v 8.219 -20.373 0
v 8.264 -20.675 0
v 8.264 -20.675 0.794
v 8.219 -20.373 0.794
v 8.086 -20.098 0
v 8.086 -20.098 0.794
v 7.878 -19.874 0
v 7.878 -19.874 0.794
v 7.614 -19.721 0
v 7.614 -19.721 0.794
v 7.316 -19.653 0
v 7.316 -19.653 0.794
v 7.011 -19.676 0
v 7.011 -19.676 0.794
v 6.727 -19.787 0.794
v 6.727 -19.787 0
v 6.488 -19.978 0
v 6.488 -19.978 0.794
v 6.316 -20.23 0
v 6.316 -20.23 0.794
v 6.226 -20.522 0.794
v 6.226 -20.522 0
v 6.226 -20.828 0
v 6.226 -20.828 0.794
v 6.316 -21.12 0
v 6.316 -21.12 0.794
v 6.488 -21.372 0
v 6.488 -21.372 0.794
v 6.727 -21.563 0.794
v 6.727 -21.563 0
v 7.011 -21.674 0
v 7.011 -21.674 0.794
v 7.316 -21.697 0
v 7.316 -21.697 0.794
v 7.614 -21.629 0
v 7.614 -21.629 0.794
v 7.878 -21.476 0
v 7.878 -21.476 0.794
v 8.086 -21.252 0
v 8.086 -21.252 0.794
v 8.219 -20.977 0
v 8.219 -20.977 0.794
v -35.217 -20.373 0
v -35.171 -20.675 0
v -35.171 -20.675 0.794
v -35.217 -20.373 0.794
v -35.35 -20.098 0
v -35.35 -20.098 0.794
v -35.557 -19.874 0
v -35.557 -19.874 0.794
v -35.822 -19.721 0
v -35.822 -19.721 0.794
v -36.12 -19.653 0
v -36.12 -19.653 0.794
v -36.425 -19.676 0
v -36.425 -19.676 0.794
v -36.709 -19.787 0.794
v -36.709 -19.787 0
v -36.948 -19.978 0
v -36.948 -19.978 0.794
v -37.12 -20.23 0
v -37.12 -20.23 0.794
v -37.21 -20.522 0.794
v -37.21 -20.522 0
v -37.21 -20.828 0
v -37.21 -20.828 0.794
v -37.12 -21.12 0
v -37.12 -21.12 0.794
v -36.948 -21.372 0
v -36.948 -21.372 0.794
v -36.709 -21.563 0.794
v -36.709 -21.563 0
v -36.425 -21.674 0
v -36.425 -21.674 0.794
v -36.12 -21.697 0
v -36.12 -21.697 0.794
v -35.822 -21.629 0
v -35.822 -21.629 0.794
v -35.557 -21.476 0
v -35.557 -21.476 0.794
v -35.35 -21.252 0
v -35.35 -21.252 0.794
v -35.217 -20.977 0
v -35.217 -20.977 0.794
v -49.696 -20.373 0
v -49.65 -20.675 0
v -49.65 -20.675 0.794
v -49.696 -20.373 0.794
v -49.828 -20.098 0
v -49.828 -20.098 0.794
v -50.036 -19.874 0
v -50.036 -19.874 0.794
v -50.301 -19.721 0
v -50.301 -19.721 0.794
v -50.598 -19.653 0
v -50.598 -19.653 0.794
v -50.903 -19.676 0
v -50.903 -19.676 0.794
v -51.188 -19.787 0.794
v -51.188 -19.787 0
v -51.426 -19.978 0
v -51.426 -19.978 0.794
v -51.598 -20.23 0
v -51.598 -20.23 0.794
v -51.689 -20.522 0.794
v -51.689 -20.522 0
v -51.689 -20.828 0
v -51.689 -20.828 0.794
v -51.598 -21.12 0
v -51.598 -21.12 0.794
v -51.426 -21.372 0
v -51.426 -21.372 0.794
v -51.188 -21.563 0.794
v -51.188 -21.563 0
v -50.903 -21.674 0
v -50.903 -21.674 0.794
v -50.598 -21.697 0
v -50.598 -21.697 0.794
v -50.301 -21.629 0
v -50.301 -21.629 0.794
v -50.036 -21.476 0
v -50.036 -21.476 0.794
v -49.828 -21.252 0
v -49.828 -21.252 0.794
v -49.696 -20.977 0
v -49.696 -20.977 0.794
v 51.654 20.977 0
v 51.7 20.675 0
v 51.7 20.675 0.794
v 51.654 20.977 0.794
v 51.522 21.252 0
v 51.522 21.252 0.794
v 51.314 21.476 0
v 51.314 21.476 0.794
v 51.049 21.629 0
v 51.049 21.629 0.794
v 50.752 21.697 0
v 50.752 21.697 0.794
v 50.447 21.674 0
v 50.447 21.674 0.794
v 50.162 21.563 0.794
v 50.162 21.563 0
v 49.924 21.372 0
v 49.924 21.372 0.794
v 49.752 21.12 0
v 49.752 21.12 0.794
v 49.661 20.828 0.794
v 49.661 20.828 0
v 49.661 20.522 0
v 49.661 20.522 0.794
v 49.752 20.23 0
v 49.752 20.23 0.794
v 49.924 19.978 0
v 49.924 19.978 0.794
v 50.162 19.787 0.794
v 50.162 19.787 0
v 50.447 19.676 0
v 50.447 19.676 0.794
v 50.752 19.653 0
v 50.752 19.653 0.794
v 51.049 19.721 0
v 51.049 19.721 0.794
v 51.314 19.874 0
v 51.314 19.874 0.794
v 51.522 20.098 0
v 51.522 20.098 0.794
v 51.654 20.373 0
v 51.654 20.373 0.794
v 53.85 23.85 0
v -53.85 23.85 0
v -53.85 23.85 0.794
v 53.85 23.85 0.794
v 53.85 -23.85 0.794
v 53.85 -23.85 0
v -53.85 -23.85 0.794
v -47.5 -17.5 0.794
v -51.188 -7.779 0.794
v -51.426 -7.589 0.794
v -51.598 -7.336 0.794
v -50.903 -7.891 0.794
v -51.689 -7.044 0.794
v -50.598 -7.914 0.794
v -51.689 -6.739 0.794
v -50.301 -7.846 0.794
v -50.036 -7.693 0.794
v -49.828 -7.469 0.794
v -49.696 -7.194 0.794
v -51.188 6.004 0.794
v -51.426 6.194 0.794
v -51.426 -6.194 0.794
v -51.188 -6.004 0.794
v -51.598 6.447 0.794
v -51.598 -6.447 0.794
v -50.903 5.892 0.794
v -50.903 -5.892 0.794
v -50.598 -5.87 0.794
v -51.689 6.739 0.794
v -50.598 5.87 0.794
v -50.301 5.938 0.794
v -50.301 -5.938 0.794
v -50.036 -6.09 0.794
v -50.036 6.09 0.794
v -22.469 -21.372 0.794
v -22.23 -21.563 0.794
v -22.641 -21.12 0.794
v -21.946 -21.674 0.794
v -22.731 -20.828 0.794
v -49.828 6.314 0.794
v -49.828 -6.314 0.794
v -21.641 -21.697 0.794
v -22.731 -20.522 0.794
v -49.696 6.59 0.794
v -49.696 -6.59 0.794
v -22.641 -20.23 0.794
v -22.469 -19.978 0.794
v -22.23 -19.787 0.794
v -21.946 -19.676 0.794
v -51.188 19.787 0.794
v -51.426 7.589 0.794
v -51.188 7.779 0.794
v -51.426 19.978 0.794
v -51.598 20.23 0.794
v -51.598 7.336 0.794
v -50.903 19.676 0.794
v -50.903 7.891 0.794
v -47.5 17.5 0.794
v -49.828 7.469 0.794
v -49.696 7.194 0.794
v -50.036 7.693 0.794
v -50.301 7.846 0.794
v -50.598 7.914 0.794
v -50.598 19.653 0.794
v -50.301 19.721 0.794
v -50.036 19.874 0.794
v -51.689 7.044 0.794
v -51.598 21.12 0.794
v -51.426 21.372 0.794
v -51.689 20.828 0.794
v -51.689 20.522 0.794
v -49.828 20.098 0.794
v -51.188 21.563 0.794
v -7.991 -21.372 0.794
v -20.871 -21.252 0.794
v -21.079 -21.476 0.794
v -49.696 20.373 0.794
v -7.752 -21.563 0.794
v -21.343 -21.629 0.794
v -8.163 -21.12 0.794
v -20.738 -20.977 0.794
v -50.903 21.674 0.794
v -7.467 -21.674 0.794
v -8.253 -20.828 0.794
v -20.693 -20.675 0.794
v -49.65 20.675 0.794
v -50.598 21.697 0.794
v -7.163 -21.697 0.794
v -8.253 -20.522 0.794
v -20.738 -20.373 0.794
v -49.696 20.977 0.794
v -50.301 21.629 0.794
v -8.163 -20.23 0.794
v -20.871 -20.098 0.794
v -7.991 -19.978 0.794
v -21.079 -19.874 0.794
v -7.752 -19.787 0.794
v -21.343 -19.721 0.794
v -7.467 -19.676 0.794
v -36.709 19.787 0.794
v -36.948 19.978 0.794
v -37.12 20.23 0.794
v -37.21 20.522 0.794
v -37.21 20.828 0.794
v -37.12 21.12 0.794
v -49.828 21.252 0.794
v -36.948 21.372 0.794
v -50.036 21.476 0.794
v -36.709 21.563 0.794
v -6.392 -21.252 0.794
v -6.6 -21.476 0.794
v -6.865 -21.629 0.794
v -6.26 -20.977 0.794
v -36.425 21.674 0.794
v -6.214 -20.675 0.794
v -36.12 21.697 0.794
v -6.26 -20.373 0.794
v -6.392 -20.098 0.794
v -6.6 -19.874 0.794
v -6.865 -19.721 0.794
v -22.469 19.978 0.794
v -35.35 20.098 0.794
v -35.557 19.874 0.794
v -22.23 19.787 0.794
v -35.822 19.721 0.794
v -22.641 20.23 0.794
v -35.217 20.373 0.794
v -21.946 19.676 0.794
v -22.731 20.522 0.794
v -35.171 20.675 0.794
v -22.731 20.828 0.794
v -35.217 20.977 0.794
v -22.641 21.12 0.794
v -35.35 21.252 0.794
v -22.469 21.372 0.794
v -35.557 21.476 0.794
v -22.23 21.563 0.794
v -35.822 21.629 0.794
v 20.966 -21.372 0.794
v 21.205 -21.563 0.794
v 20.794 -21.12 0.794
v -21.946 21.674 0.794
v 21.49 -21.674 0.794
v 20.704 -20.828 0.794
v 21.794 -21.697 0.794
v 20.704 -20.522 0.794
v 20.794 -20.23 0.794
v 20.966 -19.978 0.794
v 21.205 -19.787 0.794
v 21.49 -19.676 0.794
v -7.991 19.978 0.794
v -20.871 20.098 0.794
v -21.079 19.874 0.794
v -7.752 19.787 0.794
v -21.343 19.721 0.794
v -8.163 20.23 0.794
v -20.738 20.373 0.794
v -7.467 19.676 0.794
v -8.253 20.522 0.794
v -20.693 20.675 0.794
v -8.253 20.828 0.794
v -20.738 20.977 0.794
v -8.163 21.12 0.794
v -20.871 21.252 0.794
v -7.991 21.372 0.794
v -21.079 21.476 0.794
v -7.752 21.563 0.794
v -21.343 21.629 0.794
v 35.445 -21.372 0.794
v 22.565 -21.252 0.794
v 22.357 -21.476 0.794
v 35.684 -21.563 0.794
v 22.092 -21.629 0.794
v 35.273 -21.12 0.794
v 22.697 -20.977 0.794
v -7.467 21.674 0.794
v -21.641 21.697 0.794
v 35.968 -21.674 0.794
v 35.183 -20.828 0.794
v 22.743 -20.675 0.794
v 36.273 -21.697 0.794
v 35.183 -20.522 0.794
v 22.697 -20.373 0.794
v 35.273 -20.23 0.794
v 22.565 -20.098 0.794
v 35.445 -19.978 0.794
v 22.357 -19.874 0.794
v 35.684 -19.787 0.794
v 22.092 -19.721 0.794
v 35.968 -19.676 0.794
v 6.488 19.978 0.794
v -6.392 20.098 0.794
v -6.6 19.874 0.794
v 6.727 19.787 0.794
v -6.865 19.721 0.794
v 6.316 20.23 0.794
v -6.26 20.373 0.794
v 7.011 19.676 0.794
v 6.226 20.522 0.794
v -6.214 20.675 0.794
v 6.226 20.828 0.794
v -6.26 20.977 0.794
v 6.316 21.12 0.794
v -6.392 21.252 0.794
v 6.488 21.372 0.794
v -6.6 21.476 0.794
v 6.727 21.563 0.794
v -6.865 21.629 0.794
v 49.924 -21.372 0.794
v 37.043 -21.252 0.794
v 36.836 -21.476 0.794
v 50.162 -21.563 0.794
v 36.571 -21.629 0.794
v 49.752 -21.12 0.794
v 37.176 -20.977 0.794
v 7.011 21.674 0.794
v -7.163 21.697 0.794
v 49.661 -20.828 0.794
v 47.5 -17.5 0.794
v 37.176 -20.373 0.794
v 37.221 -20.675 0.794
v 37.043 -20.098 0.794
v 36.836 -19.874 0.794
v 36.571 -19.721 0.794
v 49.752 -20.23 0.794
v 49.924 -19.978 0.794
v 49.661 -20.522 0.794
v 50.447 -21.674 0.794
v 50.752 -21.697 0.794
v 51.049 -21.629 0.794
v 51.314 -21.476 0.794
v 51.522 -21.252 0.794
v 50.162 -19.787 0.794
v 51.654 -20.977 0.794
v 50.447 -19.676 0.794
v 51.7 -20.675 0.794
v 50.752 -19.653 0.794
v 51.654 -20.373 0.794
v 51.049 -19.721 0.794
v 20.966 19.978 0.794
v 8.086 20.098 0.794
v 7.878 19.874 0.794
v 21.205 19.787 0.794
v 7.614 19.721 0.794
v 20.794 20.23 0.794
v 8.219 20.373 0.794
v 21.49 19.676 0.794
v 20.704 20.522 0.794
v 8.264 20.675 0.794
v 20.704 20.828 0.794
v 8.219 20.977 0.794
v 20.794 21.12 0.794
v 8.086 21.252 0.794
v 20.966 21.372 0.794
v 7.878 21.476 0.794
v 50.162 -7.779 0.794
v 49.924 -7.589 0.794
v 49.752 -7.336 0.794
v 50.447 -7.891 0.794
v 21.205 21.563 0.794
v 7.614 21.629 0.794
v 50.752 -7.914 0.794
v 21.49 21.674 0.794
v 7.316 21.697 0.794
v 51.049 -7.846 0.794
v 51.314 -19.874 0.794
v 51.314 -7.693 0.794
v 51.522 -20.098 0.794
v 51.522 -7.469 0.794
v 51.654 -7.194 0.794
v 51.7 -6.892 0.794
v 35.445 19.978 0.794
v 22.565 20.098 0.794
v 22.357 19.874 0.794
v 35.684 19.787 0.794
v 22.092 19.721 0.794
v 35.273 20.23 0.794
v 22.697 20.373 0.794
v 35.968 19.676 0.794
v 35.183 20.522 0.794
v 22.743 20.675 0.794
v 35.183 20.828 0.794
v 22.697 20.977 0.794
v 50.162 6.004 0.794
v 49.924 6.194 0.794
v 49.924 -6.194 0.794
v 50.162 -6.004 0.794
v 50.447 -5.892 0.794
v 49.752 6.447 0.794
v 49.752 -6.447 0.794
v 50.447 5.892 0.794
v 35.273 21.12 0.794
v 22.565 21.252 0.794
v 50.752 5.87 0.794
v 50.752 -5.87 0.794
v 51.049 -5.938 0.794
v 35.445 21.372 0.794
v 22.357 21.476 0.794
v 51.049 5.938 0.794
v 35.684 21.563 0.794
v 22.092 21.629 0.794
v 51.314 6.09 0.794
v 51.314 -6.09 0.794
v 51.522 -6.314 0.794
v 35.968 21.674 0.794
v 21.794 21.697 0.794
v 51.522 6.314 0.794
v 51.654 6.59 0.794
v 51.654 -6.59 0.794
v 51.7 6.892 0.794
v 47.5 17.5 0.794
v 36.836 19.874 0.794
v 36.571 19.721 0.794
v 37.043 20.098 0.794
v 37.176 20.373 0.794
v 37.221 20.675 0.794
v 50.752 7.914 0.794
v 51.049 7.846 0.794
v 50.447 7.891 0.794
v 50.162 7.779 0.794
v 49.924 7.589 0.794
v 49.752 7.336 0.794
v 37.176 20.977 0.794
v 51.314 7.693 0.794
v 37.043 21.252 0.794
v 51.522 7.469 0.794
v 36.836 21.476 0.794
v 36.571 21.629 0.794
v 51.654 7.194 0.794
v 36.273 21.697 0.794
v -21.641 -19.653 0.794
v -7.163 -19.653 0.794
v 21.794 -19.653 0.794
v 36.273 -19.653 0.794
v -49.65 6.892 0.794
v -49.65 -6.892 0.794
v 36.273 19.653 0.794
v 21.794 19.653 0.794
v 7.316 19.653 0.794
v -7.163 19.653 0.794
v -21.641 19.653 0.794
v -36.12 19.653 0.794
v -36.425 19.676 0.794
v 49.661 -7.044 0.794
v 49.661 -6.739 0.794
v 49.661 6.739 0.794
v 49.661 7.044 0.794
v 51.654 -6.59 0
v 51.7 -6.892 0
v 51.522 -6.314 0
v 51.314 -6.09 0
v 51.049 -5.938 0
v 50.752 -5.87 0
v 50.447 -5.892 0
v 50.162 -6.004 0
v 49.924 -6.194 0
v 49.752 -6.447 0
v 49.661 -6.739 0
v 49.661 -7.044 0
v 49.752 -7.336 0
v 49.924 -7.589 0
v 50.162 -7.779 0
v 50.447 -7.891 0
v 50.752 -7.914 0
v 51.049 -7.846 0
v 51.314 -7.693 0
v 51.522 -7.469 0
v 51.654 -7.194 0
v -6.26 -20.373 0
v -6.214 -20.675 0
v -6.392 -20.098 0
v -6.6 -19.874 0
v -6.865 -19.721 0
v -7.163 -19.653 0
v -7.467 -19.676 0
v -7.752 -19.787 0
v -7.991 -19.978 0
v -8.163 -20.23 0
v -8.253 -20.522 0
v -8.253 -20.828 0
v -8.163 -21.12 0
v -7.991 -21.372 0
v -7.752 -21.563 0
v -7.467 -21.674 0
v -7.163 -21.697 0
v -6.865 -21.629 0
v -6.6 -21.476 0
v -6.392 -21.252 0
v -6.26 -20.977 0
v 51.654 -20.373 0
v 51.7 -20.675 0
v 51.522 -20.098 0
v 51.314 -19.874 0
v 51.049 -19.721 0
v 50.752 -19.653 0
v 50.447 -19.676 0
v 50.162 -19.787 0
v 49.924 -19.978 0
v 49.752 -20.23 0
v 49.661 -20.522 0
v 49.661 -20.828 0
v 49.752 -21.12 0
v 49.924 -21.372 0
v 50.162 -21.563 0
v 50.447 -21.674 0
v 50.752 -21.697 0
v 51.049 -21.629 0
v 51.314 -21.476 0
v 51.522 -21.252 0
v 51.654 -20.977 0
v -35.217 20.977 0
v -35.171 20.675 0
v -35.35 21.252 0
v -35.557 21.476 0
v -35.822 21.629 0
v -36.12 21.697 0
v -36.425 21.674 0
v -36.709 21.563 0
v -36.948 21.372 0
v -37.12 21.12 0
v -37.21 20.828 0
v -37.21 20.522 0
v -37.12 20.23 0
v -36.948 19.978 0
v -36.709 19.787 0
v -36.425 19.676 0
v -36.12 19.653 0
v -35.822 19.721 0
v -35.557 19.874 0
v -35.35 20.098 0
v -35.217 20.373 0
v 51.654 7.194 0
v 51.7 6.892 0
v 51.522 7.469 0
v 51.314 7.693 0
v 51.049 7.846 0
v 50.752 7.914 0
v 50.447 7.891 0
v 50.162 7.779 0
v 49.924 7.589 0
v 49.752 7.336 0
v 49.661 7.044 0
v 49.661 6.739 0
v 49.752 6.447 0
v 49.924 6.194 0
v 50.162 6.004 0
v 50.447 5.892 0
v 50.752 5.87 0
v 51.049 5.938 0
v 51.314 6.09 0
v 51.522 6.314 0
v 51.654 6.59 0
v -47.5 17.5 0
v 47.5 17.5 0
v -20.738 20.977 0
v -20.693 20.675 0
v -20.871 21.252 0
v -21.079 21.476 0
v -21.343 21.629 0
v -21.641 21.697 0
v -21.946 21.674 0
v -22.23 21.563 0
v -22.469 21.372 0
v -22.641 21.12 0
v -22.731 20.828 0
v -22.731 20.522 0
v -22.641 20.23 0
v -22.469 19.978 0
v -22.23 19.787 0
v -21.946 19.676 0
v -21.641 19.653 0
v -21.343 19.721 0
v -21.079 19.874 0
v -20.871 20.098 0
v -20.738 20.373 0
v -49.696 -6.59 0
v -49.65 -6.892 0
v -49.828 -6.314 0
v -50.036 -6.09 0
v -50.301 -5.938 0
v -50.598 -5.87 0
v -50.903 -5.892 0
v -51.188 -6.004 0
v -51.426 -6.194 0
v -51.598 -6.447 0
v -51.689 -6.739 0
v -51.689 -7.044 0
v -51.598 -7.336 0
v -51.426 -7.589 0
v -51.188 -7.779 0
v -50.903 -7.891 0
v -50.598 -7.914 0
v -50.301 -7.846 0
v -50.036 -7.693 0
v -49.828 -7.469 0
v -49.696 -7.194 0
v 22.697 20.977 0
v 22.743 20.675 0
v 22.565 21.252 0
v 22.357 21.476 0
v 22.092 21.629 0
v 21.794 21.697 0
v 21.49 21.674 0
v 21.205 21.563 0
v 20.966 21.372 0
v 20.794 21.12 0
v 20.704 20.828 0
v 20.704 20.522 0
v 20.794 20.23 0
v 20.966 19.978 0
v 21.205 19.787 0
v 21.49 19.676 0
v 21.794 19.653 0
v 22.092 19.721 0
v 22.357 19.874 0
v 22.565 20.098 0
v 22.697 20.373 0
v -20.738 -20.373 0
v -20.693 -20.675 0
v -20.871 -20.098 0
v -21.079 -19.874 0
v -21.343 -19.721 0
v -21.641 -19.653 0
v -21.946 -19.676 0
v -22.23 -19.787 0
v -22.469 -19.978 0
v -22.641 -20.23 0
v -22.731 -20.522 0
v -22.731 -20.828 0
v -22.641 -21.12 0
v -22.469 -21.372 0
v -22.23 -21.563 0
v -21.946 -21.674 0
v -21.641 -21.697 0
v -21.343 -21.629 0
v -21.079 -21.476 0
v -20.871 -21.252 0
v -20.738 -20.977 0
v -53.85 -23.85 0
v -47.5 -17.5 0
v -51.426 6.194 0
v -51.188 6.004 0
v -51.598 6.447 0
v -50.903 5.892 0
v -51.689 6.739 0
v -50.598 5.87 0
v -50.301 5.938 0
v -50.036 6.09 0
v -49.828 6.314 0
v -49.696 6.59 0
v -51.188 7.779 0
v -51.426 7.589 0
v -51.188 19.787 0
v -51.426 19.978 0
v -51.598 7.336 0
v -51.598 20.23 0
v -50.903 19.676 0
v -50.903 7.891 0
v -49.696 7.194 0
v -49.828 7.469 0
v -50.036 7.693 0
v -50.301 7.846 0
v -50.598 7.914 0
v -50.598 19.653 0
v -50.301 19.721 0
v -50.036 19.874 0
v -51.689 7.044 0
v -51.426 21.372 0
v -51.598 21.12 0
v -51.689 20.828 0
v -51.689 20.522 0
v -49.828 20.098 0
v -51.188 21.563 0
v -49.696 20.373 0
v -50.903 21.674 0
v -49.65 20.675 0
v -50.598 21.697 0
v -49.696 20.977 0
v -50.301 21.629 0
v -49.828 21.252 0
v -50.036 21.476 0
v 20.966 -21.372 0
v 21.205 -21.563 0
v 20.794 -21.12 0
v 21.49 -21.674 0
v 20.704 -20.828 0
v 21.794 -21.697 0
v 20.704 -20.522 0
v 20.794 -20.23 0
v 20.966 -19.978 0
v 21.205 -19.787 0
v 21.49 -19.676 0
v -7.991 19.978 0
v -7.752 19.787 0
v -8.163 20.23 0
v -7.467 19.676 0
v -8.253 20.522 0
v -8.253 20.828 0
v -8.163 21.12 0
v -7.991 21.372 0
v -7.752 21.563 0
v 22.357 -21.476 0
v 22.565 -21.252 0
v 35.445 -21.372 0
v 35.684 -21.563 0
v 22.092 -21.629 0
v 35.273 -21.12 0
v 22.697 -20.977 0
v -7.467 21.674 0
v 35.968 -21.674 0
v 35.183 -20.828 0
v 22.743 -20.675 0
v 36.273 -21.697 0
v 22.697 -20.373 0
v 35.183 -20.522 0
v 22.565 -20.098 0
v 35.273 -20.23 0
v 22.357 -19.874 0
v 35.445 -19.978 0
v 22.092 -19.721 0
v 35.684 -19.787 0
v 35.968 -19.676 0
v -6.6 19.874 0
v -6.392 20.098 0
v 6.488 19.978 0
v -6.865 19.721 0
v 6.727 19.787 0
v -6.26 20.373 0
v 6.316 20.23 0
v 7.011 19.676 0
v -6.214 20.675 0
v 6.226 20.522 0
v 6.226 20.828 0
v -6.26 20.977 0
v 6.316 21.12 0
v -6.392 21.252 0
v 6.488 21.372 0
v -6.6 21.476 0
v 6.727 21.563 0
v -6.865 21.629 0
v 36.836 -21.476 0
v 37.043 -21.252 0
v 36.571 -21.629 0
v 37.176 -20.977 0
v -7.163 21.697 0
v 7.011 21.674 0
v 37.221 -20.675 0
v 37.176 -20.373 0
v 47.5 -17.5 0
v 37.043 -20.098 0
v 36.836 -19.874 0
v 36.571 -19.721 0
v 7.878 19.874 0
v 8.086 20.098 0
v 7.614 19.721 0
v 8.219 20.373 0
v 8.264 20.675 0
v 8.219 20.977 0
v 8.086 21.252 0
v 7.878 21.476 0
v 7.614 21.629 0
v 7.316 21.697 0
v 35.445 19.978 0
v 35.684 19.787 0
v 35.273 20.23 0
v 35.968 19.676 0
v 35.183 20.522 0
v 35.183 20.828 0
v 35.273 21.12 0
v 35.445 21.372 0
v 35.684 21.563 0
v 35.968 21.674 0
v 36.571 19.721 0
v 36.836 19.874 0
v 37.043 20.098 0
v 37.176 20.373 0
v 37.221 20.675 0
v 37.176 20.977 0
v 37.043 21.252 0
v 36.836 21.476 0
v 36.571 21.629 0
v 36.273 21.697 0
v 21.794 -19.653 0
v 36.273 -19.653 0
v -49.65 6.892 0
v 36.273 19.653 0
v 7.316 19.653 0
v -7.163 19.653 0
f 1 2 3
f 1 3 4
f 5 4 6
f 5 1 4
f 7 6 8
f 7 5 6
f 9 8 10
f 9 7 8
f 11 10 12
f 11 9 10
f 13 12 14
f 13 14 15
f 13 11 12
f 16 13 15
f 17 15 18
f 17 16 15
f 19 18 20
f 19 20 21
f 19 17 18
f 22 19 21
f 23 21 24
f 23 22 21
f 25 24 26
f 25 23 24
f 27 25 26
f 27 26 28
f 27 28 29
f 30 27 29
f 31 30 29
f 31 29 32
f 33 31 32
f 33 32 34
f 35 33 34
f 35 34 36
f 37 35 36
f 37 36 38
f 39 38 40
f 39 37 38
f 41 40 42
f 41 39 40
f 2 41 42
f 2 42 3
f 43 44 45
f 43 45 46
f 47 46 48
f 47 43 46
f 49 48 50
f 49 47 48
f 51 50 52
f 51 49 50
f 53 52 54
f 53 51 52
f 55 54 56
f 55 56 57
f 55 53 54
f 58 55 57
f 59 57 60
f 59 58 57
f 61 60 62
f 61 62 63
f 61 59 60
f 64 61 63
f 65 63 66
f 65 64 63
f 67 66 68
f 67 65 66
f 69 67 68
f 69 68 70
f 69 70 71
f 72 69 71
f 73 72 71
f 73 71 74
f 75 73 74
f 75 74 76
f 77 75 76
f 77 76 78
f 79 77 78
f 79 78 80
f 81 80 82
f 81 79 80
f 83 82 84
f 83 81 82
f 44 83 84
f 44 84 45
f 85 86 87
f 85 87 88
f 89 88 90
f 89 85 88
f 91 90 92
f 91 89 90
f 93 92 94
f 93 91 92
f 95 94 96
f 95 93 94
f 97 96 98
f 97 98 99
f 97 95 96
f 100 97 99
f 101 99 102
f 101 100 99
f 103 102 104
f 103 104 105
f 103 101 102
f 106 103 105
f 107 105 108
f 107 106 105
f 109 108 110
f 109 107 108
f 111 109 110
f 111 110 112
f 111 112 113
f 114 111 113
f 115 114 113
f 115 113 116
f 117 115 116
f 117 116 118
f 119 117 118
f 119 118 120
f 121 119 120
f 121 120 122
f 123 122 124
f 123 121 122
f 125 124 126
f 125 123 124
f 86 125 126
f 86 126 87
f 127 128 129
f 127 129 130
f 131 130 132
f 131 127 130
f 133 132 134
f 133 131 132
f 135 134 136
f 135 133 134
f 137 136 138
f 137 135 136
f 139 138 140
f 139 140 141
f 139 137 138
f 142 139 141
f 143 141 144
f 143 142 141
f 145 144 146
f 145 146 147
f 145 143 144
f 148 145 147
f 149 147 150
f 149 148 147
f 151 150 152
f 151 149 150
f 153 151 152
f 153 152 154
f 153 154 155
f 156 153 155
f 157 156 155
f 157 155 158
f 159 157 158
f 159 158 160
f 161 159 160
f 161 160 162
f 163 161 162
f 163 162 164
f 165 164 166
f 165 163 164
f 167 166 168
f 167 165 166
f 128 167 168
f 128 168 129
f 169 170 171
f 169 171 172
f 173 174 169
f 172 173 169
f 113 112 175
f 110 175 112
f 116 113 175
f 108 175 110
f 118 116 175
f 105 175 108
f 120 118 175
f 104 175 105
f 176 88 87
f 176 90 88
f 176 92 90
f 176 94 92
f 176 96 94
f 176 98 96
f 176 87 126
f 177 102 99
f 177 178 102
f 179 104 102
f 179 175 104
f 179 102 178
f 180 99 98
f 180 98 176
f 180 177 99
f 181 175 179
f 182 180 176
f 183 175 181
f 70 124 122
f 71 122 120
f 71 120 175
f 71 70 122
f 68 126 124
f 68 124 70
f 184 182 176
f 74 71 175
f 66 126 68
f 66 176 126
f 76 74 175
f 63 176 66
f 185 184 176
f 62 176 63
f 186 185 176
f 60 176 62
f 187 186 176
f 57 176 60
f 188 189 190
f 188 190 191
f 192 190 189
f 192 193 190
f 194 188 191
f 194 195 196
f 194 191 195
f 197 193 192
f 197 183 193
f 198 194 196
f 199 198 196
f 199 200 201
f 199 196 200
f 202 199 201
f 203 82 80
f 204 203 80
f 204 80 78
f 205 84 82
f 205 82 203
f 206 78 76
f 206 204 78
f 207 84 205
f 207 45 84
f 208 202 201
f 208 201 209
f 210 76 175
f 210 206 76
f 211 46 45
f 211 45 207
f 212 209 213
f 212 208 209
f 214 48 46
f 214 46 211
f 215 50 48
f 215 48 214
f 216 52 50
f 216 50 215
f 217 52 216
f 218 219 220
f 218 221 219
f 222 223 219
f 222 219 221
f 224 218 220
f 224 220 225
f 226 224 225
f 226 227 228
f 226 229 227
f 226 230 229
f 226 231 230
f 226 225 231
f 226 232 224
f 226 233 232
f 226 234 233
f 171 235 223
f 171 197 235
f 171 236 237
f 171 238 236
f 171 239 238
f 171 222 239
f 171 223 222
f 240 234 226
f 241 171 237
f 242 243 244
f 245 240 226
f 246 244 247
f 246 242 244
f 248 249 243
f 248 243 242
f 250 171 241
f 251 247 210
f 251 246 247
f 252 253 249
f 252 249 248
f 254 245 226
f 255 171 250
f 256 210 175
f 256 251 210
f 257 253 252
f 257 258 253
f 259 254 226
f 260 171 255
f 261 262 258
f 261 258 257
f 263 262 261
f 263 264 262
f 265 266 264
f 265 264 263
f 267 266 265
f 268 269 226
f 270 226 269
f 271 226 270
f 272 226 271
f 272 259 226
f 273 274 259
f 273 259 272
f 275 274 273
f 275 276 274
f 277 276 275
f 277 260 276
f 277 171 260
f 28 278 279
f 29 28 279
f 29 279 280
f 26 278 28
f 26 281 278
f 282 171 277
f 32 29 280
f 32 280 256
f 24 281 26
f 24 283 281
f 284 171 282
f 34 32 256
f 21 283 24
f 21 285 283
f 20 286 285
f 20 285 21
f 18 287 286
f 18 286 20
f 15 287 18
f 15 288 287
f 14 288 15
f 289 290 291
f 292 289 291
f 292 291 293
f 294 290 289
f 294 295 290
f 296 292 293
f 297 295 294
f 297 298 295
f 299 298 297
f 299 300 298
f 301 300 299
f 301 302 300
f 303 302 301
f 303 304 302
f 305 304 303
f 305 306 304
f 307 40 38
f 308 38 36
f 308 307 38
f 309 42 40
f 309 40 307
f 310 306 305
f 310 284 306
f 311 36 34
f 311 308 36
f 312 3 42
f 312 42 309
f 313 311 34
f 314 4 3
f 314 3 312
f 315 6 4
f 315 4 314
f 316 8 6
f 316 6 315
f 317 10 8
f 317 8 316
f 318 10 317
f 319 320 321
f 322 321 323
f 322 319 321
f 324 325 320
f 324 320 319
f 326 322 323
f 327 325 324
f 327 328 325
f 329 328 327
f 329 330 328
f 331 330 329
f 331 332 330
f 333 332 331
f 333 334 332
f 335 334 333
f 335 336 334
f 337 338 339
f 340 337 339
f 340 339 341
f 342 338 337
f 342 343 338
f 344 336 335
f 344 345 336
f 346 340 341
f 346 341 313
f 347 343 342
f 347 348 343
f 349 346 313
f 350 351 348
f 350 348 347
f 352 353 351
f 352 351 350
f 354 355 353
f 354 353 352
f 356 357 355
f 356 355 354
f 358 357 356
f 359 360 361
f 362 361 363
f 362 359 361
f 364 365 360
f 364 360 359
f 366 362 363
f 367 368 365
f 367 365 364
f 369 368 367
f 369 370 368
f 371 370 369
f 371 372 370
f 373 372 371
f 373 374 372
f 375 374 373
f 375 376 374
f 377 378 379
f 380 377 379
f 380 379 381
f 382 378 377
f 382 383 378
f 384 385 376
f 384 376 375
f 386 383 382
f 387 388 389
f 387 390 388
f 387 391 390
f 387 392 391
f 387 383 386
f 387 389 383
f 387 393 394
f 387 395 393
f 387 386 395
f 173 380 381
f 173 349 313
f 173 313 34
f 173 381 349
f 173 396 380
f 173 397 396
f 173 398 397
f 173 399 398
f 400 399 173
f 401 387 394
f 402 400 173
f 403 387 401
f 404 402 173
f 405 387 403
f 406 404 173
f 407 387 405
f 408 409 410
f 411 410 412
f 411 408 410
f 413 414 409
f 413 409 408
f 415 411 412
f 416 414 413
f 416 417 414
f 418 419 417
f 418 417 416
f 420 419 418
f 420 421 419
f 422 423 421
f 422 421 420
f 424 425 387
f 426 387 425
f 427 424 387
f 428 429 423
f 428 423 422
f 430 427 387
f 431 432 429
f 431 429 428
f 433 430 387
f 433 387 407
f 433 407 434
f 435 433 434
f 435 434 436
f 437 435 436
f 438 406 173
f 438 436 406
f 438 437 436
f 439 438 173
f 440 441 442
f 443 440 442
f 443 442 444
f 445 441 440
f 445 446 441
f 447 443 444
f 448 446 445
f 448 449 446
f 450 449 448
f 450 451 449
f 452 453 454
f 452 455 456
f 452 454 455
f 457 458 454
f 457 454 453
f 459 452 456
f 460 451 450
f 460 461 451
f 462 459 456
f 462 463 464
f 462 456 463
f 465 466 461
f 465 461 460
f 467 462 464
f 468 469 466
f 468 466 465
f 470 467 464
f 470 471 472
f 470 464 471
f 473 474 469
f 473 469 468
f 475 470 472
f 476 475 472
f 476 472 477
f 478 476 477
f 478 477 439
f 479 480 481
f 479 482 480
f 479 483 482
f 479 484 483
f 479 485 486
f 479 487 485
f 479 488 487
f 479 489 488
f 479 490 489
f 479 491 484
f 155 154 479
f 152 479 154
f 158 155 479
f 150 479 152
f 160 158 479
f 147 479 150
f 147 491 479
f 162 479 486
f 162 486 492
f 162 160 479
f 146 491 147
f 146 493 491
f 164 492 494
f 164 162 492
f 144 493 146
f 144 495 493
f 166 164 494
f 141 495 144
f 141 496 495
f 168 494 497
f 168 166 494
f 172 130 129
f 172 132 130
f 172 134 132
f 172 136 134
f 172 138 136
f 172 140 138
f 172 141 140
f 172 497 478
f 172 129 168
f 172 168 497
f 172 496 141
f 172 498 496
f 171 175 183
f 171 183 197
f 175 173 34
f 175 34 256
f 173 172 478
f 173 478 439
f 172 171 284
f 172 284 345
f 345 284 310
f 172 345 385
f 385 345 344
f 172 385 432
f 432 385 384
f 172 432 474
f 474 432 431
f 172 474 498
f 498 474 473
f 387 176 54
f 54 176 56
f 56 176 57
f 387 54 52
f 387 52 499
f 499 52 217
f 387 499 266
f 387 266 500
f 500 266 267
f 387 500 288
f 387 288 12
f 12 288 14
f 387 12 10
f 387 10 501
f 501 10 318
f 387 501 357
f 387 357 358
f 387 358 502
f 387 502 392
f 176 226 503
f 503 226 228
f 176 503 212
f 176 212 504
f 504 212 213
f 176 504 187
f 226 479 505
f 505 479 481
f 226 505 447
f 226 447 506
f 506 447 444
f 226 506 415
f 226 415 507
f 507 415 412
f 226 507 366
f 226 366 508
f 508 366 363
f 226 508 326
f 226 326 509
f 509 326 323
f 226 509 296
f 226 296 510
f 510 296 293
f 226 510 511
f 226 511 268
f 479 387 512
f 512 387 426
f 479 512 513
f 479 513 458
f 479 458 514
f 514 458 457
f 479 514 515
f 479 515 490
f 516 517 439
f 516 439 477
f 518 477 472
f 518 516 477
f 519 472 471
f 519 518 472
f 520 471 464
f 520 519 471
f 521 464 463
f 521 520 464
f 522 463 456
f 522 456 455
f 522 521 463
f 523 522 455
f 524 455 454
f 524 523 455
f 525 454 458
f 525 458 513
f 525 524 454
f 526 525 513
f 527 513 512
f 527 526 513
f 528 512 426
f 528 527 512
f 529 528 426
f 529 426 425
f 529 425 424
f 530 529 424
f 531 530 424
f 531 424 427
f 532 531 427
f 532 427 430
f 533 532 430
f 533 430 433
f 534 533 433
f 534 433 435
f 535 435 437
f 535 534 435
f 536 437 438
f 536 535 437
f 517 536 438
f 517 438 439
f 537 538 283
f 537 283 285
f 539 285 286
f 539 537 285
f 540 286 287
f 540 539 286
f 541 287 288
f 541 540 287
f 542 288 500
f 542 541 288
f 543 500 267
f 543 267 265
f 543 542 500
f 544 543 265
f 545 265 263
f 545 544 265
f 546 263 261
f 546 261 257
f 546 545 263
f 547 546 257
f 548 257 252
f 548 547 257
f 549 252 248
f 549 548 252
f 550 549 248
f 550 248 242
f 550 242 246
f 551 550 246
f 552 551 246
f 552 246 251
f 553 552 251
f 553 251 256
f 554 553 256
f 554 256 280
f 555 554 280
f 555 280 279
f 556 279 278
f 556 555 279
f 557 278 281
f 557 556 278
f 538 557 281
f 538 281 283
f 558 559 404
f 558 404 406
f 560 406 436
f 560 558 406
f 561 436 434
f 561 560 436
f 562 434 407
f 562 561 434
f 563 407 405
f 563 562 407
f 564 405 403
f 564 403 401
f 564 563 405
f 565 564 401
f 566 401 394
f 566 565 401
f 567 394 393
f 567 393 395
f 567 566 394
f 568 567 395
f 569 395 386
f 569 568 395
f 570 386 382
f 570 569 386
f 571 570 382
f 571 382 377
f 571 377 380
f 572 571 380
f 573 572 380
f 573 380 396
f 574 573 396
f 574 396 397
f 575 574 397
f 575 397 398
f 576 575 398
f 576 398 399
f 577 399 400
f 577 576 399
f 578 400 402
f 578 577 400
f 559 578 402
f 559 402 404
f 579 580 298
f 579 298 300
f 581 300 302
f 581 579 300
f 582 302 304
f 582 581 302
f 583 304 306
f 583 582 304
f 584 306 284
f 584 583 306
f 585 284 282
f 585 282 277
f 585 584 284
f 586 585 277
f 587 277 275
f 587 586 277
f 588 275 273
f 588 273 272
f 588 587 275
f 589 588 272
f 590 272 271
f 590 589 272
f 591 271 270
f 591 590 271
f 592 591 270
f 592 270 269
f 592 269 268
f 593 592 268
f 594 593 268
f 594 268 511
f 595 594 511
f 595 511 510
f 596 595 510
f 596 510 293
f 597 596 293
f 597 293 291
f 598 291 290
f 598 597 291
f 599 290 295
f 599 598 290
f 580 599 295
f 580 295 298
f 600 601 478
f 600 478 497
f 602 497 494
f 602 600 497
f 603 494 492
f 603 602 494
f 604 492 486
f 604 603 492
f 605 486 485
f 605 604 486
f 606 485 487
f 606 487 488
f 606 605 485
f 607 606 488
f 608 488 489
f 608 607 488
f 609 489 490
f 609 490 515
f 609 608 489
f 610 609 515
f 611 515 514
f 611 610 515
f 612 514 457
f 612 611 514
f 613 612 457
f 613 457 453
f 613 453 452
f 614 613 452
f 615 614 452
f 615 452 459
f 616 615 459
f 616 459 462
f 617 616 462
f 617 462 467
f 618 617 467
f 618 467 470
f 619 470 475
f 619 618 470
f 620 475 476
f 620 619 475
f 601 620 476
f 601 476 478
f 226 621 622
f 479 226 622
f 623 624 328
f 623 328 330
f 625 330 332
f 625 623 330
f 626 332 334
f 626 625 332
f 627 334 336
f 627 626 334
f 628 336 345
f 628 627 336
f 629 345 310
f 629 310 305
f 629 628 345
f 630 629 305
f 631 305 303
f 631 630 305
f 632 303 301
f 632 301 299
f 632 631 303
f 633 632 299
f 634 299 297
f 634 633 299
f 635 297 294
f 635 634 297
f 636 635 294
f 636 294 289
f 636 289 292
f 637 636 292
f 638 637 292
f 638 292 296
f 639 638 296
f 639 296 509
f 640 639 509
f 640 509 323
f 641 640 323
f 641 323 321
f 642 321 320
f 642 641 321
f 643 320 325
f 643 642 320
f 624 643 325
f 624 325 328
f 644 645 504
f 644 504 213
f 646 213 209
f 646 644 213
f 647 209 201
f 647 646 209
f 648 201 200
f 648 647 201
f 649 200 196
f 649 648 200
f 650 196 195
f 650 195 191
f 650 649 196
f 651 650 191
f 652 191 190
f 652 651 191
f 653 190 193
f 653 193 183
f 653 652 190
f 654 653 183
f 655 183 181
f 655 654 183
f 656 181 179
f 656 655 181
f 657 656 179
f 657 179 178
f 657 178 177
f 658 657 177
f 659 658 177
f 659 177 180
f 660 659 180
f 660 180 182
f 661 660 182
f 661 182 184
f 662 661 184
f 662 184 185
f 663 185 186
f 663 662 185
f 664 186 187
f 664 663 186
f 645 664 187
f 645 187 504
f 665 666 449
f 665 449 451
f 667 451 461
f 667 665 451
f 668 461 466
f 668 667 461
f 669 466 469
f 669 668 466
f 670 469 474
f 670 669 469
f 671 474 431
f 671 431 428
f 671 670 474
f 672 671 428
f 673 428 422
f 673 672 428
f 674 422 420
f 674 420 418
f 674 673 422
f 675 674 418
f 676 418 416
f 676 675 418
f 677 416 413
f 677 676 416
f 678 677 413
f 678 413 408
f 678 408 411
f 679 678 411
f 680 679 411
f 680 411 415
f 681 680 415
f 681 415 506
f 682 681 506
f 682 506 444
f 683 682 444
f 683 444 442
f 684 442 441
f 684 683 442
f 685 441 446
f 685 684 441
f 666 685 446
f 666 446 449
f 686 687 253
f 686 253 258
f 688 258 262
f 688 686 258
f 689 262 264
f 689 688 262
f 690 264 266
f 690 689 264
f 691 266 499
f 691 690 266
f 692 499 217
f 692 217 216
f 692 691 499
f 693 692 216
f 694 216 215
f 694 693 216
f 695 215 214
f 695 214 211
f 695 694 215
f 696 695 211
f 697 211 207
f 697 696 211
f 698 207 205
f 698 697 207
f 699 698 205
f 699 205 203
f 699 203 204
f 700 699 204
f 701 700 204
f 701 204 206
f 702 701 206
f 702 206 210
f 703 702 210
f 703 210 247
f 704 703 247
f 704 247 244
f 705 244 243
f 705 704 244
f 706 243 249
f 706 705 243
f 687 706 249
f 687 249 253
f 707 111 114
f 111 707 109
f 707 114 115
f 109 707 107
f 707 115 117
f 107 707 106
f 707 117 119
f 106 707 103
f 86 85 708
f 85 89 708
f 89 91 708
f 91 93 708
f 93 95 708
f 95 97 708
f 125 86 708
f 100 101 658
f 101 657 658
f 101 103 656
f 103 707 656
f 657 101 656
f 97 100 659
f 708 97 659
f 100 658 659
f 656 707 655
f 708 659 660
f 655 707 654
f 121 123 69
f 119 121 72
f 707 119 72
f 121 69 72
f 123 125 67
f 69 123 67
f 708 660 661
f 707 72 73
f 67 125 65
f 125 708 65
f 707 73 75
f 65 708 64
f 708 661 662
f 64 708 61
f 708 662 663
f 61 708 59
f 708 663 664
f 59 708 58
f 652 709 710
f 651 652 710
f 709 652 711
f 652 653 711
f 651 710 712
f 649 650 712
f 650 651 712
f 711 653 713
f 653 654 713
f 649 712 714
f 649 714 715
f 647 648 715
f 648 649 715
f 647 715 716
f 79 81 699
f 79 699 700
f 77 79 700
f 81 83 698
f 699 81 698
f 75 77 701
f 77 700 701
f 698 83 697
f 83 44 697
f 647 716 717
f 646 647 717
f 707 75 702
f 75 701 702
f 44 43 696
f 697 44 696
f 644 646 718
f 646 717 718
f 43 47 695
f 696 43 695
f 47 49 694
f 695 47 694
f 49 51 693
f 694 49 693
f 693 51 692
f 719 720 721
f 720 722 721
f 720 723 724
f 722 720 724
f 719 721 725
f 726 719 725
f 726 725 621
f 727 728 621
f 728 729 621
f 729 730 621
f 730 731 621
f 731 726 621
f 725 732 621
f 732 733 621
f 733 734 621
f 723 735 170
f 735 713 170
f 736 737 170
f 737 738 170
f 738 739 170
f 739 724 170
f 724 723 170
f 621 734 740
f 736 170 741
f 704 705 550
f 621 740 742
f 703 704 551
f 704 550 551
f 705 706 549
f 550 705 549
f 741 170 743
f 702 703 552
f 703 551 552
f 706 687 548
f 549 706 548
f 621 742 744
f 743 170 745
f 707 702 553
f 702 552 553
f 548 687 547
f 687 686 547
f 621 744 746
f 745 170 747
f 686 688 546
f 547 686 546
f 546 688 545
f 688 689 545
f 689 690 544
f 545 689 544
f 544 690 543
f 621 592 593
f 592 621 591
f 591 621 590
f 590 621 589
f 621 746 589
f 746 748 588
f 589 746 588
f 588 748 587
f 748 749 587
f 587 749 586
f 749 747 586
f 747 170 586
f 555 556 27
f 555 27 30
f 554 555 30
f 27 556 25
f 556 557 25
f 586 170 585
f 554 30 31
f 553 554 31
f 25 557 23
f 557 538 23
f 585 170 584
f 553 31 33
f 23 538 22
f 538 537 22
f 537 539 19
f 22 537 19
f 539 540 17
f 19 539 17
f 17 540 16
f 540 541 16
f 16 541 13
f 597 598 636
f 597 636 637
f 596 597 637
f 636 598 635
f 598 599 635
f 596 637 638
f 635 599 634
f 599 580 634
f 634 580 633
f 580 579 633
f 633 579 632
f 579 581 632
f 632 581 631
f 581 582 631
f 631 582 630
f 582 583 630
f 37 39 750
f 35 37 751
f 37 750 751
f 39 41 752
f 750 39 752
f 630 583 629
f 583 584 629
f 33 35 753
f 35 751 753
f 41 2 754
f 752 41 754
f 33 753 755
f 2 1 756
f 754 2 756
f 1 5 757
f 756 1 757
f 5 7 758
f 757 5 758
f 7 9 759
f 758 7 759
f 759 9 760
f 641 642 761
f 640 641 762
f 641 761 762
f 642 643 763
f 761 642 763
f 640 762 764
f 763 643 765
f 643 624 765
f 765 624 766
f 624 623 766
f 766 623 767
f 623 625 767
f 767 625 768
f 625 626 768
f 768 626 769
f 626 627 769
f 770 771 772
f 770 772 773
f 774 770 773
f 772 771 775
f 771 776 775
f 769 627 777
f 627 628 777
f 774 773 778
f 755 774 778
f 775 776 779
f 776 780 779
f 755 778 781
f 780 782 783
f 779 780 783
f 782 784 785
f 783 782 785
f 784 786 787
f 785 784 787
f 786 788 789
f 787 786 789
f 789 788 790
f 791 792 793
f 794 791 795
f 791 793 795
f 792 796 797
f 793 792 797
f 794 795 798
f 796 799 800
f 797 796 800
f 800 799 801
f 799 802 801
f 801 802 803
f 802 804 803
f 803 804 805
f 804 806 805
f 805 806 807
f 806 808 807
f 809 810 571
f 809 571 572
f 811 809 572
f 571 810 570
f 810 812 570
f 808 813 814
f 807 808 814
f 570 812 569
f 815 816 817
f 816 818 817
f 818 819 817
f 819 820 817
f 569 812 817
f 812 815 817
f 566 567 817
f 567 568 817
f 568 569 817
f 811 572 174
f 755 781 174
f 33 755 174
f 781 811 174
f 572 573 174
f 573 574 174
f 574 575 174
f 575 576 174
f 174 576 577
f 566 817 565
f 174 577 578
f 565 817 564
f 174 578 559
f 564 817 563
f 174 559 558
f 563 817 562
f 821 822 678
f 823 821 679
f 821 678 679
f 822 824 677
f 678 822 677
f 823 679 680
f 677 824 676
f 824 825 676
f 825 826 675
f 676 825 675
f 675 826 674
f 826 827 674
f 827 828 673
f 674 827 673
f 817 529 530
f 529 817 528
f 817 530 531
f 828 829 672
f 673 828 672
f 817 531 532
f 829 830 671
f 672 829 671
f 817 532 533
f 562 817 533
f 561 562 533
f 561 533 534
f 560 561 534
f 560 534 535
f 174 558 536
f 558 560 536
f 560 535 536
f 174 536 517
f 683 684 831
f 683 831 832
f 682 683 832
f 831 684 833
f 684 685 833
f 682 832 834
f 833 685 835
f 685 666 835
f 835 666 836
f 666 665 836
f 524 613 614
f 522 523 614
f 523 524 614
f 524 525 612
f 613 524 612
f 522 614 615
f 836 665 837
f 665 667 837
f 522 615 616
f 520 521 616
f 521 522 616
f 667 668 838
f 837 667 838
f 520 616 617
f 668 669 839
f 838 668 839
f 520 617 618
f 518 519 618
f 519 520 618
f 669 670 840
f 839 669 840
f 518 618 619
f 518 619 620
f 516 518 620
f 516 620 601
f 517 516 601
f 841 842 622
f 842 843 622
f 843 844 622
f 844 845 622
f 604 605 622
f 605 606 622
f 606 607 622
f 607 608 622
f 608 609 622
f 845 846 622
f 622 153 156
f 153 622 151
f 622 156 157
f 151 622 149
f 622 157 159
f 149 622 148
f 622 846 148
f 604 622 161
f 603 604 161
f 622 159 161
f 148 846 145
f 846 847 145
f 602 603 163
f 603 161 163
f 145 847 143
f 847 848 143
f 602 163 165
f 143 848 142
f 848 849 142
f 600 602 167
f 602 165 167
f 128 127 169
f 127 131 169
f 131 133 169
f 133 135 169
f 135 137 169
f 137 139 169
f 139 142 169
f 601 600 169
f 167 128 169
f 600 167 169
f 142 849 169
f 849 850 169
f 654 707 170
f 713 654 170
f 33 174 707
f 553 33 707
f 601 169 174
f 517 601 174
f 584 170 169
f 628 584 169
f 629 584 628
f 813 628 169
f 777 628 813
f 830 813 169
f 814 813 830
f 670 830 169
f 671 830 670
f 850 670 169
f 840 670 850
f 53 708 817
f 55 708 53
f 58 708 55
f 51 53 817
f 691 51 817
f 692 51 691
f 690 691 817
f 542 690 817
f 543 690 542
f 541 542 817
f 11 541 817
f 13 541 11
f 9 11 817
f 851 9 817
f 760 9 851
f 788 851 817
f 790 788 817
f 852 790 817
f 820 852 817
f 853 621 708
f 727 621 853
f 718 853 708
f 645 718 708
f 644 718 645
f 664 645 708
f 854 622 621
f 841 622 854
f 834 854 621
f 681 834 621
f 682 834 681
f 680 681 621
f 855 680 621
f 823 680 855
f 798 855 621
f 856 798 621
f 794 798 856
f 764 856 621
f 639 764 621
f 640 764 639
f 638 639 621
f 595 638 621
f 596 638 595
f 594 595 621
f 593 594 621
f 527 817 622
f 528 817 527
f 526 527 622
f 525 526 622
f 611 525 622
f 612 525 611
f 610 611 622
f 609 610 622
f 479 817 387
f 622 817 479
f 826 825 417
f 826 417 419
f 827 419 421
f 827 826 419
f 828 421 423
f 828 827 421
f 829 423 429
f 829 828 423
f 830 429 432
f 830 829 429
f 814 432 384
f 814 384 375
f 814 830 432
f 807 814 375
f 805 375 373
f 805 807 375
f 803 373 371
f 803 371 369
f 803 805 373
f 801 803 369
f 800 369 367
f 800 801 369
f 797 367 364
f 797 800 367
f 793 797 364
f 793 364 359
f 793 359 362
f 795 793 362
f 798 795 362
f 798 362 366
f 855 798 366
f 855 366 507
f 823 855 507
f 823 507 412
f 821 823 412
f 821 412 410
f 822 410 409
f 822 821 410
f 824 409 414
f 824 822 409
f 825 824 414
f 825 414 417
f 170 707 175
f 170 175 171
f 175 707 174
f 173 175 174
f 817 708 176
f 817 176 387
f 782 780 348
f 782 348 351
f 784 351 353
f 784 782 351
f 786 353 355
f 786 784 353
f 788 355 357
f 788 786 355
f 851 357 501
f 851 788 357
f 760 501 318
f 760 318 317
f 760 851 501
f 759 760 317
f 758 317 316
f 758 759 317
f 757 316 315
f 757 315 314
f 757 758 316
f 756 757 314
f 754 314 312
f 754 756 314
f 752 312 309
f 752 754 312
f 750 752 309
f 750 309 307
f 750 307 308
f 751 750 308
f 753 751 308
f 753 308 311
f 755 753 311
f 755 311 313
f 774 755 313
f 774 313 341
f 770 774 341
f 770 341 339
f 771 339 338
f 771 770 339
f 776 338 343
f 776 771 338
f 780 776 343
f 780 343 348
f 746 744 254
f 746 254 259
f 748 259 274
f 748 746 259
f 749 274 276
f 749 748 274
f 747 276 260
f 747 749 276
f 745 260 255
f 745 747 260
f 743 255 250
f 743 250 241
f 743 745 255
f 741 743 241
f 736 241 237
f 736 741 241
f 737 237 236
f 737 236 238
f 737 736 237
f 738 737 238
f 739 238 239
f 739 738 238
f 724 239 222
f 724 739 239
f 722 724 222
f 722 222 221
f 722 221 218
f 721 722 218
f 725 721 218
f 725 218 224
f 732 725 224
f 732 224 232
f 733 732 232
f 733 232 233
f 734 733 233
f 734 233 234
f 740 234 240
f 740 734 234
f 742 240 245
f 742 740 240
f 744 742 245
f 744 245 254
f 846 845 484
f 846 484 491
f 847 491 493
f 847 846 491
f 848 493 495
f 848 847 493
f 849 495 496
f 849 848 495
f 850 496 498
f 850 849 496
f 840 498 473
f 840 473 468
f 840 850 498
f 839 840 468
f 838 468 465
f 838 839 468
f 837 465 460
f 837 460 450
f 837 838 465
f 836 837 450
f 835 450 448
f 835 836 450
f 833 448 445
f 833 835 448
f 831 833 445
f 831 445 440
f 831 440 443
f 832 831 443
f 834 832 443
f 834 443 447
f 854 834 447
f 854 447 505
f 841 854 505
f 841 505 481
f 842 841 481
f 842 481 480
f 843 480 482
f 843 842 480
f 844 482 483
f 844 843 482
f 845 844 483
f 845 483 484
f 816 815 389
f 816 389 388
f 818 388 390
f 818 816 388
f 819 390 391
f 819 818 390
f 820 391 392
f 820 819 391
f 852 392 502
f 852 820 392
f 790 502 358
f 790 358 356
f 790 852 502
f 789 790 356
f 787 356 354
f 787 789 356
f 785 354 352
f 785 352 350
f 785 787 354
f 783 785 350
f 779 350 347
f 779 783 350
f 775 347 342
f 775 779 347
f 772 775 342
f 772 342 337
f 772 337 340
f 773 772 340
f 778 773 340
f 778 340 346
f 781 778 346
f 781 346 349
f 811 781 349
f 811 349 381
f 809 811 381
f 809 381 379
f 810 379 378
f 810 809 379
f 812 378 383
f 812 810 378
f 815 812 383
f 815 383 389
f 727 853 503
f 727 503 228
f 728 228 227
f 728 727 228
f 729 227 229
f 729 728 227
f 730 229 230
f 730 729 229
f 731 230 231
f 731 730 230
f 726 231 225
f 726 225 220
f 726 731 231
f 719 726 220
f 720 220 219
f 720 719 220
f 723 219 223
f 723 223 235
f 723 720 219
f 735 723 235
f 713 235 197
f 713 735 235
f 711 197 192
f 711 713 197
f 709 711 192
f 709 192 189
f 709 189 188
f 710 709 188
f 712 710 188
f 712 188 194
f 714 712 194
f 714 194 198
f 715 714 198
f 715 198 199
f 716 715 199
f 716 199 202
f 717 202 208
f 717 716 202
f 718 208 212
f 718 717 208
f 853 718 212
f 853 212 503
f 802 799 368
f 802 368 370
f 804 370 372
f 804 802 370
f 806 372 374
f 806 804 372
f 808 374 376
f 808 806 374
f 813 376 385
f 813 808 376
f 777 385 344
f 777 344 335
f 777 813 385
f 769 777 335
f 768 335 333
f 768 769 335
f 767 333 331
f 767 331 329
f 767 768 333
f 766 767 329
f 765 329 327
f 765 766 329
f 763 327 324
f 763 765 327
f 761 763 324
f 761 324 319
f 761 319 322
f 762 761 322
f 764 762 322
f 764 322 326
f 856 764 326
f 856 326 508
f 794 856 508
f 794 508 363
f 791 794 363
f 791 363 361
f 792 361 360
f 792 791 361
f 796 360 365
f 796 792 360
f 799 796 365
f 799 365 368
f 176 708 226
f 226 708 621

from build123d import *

# Parameters (mm, degrees)
SKETCH1_W           = 107.7
SKETCH1_H           = 47.7
SKETCH1_R           = 1.025
SKETCH1_W_2         = 95
SKETCH1_H_2         = 35
BOSS_EXTRUDE1_DEPTH = 0.79375


with BuildPart() as part:
    # Sketch1 → Boss-Extrude1 (new body)
    with BuildSketch(Plane.XY):
        Rectangle(SKETCH1_W, SKETCH1_H)
        with Locations((-50.675, 20.675)):
            Circle(SKETCH1_R, mode=Mode.SUBTRACT)
        with Locations((50.675, 20.675)):
            Circle(SKETCH1_R, mode=Mode.SUBTRACT)
        with Locations((-50.675, -20.675)):
            Circle(SKETCH1_R, mode=Mode.SUBTRACT)
        with Locations((50.675, -20.675)):
            Circle(SKETCH1_R, mode=Mode.SUBTRACT)
        with Locations((-7.239285714, 20.675)):
            Circle(SKETCH1_R, mode=Mode.SUBTRACT)
        with Locations((-7.239285714, -20.675)):
            Circle(SKETCH1_R, mode=Mode.SUBTRACT)
        with Locations((-36.196428571, 20.675)):
            Circle(SKETCH1_R, mode=Mode.SUBTRACT)
        with Locations((-21.717857143, 20.675)):
            Circle(SKETCH1_R, mode=Mode.SUBTRACT)
        with Locations((7.239285714, 20.675)):
            Circle(SKETCH1_R, mode=Mode.SUBTRACT)
        with Locations((21.717857143, 20.675)):
            Circle(SKETCH1_R, mode=Mode.SUBTRACT)
        with Locations((-50.675, 6.8916667)):
            Circle(SKETCH1_R, mode=Mode.SUBTRACT)
        with Locations((-50.675, -6.8916667)):
            Circle(SKETCH1_R, mode=Mode.SUBTRACT)
        with Locations((50.675, 6.8916667)):
            Circle(SKETCH1_R, mode=Mode.SUBTRACT)
        with Locations((50.675, -6.8916667)):
            Circle(SKETCH1_R, mode=Mode.SUBTRACT)
        with Locations((7.239285714, -20.675)):
            Circle(SKETCH1_R, mode=Mode.SUBTRACT)
        with Locations((21.717857143, -20.675)):
            Circle(SKETCH1_R, mode=Mode.SUBTRACT)
        with Locations((-21.717857143, -20.675)):
            Circle(SKETCH1_R, mode=Mode.SUBTRACT)
        with Locations((-36.196428571, -20.675)):
            Circle(SKETCH1_R, mode=Mode.SUBTRACT)
        with Locations((36.196428572, 20.675)):
            Circle(SKETCH1_R, mode=Mode.SUBTRACT)
        with Locations((36.196428572, -20.675)):
            Circle(SKETCH1_R, mode=Mode.SUBTRACT)
        Rectangle(SKETCH1_W_2, SKETCH1_H_2, mode=Mode.SUBTRACT)
    extrude(amount=BOSS_EXTRUDE1_DEPTH)


solid = part.part
